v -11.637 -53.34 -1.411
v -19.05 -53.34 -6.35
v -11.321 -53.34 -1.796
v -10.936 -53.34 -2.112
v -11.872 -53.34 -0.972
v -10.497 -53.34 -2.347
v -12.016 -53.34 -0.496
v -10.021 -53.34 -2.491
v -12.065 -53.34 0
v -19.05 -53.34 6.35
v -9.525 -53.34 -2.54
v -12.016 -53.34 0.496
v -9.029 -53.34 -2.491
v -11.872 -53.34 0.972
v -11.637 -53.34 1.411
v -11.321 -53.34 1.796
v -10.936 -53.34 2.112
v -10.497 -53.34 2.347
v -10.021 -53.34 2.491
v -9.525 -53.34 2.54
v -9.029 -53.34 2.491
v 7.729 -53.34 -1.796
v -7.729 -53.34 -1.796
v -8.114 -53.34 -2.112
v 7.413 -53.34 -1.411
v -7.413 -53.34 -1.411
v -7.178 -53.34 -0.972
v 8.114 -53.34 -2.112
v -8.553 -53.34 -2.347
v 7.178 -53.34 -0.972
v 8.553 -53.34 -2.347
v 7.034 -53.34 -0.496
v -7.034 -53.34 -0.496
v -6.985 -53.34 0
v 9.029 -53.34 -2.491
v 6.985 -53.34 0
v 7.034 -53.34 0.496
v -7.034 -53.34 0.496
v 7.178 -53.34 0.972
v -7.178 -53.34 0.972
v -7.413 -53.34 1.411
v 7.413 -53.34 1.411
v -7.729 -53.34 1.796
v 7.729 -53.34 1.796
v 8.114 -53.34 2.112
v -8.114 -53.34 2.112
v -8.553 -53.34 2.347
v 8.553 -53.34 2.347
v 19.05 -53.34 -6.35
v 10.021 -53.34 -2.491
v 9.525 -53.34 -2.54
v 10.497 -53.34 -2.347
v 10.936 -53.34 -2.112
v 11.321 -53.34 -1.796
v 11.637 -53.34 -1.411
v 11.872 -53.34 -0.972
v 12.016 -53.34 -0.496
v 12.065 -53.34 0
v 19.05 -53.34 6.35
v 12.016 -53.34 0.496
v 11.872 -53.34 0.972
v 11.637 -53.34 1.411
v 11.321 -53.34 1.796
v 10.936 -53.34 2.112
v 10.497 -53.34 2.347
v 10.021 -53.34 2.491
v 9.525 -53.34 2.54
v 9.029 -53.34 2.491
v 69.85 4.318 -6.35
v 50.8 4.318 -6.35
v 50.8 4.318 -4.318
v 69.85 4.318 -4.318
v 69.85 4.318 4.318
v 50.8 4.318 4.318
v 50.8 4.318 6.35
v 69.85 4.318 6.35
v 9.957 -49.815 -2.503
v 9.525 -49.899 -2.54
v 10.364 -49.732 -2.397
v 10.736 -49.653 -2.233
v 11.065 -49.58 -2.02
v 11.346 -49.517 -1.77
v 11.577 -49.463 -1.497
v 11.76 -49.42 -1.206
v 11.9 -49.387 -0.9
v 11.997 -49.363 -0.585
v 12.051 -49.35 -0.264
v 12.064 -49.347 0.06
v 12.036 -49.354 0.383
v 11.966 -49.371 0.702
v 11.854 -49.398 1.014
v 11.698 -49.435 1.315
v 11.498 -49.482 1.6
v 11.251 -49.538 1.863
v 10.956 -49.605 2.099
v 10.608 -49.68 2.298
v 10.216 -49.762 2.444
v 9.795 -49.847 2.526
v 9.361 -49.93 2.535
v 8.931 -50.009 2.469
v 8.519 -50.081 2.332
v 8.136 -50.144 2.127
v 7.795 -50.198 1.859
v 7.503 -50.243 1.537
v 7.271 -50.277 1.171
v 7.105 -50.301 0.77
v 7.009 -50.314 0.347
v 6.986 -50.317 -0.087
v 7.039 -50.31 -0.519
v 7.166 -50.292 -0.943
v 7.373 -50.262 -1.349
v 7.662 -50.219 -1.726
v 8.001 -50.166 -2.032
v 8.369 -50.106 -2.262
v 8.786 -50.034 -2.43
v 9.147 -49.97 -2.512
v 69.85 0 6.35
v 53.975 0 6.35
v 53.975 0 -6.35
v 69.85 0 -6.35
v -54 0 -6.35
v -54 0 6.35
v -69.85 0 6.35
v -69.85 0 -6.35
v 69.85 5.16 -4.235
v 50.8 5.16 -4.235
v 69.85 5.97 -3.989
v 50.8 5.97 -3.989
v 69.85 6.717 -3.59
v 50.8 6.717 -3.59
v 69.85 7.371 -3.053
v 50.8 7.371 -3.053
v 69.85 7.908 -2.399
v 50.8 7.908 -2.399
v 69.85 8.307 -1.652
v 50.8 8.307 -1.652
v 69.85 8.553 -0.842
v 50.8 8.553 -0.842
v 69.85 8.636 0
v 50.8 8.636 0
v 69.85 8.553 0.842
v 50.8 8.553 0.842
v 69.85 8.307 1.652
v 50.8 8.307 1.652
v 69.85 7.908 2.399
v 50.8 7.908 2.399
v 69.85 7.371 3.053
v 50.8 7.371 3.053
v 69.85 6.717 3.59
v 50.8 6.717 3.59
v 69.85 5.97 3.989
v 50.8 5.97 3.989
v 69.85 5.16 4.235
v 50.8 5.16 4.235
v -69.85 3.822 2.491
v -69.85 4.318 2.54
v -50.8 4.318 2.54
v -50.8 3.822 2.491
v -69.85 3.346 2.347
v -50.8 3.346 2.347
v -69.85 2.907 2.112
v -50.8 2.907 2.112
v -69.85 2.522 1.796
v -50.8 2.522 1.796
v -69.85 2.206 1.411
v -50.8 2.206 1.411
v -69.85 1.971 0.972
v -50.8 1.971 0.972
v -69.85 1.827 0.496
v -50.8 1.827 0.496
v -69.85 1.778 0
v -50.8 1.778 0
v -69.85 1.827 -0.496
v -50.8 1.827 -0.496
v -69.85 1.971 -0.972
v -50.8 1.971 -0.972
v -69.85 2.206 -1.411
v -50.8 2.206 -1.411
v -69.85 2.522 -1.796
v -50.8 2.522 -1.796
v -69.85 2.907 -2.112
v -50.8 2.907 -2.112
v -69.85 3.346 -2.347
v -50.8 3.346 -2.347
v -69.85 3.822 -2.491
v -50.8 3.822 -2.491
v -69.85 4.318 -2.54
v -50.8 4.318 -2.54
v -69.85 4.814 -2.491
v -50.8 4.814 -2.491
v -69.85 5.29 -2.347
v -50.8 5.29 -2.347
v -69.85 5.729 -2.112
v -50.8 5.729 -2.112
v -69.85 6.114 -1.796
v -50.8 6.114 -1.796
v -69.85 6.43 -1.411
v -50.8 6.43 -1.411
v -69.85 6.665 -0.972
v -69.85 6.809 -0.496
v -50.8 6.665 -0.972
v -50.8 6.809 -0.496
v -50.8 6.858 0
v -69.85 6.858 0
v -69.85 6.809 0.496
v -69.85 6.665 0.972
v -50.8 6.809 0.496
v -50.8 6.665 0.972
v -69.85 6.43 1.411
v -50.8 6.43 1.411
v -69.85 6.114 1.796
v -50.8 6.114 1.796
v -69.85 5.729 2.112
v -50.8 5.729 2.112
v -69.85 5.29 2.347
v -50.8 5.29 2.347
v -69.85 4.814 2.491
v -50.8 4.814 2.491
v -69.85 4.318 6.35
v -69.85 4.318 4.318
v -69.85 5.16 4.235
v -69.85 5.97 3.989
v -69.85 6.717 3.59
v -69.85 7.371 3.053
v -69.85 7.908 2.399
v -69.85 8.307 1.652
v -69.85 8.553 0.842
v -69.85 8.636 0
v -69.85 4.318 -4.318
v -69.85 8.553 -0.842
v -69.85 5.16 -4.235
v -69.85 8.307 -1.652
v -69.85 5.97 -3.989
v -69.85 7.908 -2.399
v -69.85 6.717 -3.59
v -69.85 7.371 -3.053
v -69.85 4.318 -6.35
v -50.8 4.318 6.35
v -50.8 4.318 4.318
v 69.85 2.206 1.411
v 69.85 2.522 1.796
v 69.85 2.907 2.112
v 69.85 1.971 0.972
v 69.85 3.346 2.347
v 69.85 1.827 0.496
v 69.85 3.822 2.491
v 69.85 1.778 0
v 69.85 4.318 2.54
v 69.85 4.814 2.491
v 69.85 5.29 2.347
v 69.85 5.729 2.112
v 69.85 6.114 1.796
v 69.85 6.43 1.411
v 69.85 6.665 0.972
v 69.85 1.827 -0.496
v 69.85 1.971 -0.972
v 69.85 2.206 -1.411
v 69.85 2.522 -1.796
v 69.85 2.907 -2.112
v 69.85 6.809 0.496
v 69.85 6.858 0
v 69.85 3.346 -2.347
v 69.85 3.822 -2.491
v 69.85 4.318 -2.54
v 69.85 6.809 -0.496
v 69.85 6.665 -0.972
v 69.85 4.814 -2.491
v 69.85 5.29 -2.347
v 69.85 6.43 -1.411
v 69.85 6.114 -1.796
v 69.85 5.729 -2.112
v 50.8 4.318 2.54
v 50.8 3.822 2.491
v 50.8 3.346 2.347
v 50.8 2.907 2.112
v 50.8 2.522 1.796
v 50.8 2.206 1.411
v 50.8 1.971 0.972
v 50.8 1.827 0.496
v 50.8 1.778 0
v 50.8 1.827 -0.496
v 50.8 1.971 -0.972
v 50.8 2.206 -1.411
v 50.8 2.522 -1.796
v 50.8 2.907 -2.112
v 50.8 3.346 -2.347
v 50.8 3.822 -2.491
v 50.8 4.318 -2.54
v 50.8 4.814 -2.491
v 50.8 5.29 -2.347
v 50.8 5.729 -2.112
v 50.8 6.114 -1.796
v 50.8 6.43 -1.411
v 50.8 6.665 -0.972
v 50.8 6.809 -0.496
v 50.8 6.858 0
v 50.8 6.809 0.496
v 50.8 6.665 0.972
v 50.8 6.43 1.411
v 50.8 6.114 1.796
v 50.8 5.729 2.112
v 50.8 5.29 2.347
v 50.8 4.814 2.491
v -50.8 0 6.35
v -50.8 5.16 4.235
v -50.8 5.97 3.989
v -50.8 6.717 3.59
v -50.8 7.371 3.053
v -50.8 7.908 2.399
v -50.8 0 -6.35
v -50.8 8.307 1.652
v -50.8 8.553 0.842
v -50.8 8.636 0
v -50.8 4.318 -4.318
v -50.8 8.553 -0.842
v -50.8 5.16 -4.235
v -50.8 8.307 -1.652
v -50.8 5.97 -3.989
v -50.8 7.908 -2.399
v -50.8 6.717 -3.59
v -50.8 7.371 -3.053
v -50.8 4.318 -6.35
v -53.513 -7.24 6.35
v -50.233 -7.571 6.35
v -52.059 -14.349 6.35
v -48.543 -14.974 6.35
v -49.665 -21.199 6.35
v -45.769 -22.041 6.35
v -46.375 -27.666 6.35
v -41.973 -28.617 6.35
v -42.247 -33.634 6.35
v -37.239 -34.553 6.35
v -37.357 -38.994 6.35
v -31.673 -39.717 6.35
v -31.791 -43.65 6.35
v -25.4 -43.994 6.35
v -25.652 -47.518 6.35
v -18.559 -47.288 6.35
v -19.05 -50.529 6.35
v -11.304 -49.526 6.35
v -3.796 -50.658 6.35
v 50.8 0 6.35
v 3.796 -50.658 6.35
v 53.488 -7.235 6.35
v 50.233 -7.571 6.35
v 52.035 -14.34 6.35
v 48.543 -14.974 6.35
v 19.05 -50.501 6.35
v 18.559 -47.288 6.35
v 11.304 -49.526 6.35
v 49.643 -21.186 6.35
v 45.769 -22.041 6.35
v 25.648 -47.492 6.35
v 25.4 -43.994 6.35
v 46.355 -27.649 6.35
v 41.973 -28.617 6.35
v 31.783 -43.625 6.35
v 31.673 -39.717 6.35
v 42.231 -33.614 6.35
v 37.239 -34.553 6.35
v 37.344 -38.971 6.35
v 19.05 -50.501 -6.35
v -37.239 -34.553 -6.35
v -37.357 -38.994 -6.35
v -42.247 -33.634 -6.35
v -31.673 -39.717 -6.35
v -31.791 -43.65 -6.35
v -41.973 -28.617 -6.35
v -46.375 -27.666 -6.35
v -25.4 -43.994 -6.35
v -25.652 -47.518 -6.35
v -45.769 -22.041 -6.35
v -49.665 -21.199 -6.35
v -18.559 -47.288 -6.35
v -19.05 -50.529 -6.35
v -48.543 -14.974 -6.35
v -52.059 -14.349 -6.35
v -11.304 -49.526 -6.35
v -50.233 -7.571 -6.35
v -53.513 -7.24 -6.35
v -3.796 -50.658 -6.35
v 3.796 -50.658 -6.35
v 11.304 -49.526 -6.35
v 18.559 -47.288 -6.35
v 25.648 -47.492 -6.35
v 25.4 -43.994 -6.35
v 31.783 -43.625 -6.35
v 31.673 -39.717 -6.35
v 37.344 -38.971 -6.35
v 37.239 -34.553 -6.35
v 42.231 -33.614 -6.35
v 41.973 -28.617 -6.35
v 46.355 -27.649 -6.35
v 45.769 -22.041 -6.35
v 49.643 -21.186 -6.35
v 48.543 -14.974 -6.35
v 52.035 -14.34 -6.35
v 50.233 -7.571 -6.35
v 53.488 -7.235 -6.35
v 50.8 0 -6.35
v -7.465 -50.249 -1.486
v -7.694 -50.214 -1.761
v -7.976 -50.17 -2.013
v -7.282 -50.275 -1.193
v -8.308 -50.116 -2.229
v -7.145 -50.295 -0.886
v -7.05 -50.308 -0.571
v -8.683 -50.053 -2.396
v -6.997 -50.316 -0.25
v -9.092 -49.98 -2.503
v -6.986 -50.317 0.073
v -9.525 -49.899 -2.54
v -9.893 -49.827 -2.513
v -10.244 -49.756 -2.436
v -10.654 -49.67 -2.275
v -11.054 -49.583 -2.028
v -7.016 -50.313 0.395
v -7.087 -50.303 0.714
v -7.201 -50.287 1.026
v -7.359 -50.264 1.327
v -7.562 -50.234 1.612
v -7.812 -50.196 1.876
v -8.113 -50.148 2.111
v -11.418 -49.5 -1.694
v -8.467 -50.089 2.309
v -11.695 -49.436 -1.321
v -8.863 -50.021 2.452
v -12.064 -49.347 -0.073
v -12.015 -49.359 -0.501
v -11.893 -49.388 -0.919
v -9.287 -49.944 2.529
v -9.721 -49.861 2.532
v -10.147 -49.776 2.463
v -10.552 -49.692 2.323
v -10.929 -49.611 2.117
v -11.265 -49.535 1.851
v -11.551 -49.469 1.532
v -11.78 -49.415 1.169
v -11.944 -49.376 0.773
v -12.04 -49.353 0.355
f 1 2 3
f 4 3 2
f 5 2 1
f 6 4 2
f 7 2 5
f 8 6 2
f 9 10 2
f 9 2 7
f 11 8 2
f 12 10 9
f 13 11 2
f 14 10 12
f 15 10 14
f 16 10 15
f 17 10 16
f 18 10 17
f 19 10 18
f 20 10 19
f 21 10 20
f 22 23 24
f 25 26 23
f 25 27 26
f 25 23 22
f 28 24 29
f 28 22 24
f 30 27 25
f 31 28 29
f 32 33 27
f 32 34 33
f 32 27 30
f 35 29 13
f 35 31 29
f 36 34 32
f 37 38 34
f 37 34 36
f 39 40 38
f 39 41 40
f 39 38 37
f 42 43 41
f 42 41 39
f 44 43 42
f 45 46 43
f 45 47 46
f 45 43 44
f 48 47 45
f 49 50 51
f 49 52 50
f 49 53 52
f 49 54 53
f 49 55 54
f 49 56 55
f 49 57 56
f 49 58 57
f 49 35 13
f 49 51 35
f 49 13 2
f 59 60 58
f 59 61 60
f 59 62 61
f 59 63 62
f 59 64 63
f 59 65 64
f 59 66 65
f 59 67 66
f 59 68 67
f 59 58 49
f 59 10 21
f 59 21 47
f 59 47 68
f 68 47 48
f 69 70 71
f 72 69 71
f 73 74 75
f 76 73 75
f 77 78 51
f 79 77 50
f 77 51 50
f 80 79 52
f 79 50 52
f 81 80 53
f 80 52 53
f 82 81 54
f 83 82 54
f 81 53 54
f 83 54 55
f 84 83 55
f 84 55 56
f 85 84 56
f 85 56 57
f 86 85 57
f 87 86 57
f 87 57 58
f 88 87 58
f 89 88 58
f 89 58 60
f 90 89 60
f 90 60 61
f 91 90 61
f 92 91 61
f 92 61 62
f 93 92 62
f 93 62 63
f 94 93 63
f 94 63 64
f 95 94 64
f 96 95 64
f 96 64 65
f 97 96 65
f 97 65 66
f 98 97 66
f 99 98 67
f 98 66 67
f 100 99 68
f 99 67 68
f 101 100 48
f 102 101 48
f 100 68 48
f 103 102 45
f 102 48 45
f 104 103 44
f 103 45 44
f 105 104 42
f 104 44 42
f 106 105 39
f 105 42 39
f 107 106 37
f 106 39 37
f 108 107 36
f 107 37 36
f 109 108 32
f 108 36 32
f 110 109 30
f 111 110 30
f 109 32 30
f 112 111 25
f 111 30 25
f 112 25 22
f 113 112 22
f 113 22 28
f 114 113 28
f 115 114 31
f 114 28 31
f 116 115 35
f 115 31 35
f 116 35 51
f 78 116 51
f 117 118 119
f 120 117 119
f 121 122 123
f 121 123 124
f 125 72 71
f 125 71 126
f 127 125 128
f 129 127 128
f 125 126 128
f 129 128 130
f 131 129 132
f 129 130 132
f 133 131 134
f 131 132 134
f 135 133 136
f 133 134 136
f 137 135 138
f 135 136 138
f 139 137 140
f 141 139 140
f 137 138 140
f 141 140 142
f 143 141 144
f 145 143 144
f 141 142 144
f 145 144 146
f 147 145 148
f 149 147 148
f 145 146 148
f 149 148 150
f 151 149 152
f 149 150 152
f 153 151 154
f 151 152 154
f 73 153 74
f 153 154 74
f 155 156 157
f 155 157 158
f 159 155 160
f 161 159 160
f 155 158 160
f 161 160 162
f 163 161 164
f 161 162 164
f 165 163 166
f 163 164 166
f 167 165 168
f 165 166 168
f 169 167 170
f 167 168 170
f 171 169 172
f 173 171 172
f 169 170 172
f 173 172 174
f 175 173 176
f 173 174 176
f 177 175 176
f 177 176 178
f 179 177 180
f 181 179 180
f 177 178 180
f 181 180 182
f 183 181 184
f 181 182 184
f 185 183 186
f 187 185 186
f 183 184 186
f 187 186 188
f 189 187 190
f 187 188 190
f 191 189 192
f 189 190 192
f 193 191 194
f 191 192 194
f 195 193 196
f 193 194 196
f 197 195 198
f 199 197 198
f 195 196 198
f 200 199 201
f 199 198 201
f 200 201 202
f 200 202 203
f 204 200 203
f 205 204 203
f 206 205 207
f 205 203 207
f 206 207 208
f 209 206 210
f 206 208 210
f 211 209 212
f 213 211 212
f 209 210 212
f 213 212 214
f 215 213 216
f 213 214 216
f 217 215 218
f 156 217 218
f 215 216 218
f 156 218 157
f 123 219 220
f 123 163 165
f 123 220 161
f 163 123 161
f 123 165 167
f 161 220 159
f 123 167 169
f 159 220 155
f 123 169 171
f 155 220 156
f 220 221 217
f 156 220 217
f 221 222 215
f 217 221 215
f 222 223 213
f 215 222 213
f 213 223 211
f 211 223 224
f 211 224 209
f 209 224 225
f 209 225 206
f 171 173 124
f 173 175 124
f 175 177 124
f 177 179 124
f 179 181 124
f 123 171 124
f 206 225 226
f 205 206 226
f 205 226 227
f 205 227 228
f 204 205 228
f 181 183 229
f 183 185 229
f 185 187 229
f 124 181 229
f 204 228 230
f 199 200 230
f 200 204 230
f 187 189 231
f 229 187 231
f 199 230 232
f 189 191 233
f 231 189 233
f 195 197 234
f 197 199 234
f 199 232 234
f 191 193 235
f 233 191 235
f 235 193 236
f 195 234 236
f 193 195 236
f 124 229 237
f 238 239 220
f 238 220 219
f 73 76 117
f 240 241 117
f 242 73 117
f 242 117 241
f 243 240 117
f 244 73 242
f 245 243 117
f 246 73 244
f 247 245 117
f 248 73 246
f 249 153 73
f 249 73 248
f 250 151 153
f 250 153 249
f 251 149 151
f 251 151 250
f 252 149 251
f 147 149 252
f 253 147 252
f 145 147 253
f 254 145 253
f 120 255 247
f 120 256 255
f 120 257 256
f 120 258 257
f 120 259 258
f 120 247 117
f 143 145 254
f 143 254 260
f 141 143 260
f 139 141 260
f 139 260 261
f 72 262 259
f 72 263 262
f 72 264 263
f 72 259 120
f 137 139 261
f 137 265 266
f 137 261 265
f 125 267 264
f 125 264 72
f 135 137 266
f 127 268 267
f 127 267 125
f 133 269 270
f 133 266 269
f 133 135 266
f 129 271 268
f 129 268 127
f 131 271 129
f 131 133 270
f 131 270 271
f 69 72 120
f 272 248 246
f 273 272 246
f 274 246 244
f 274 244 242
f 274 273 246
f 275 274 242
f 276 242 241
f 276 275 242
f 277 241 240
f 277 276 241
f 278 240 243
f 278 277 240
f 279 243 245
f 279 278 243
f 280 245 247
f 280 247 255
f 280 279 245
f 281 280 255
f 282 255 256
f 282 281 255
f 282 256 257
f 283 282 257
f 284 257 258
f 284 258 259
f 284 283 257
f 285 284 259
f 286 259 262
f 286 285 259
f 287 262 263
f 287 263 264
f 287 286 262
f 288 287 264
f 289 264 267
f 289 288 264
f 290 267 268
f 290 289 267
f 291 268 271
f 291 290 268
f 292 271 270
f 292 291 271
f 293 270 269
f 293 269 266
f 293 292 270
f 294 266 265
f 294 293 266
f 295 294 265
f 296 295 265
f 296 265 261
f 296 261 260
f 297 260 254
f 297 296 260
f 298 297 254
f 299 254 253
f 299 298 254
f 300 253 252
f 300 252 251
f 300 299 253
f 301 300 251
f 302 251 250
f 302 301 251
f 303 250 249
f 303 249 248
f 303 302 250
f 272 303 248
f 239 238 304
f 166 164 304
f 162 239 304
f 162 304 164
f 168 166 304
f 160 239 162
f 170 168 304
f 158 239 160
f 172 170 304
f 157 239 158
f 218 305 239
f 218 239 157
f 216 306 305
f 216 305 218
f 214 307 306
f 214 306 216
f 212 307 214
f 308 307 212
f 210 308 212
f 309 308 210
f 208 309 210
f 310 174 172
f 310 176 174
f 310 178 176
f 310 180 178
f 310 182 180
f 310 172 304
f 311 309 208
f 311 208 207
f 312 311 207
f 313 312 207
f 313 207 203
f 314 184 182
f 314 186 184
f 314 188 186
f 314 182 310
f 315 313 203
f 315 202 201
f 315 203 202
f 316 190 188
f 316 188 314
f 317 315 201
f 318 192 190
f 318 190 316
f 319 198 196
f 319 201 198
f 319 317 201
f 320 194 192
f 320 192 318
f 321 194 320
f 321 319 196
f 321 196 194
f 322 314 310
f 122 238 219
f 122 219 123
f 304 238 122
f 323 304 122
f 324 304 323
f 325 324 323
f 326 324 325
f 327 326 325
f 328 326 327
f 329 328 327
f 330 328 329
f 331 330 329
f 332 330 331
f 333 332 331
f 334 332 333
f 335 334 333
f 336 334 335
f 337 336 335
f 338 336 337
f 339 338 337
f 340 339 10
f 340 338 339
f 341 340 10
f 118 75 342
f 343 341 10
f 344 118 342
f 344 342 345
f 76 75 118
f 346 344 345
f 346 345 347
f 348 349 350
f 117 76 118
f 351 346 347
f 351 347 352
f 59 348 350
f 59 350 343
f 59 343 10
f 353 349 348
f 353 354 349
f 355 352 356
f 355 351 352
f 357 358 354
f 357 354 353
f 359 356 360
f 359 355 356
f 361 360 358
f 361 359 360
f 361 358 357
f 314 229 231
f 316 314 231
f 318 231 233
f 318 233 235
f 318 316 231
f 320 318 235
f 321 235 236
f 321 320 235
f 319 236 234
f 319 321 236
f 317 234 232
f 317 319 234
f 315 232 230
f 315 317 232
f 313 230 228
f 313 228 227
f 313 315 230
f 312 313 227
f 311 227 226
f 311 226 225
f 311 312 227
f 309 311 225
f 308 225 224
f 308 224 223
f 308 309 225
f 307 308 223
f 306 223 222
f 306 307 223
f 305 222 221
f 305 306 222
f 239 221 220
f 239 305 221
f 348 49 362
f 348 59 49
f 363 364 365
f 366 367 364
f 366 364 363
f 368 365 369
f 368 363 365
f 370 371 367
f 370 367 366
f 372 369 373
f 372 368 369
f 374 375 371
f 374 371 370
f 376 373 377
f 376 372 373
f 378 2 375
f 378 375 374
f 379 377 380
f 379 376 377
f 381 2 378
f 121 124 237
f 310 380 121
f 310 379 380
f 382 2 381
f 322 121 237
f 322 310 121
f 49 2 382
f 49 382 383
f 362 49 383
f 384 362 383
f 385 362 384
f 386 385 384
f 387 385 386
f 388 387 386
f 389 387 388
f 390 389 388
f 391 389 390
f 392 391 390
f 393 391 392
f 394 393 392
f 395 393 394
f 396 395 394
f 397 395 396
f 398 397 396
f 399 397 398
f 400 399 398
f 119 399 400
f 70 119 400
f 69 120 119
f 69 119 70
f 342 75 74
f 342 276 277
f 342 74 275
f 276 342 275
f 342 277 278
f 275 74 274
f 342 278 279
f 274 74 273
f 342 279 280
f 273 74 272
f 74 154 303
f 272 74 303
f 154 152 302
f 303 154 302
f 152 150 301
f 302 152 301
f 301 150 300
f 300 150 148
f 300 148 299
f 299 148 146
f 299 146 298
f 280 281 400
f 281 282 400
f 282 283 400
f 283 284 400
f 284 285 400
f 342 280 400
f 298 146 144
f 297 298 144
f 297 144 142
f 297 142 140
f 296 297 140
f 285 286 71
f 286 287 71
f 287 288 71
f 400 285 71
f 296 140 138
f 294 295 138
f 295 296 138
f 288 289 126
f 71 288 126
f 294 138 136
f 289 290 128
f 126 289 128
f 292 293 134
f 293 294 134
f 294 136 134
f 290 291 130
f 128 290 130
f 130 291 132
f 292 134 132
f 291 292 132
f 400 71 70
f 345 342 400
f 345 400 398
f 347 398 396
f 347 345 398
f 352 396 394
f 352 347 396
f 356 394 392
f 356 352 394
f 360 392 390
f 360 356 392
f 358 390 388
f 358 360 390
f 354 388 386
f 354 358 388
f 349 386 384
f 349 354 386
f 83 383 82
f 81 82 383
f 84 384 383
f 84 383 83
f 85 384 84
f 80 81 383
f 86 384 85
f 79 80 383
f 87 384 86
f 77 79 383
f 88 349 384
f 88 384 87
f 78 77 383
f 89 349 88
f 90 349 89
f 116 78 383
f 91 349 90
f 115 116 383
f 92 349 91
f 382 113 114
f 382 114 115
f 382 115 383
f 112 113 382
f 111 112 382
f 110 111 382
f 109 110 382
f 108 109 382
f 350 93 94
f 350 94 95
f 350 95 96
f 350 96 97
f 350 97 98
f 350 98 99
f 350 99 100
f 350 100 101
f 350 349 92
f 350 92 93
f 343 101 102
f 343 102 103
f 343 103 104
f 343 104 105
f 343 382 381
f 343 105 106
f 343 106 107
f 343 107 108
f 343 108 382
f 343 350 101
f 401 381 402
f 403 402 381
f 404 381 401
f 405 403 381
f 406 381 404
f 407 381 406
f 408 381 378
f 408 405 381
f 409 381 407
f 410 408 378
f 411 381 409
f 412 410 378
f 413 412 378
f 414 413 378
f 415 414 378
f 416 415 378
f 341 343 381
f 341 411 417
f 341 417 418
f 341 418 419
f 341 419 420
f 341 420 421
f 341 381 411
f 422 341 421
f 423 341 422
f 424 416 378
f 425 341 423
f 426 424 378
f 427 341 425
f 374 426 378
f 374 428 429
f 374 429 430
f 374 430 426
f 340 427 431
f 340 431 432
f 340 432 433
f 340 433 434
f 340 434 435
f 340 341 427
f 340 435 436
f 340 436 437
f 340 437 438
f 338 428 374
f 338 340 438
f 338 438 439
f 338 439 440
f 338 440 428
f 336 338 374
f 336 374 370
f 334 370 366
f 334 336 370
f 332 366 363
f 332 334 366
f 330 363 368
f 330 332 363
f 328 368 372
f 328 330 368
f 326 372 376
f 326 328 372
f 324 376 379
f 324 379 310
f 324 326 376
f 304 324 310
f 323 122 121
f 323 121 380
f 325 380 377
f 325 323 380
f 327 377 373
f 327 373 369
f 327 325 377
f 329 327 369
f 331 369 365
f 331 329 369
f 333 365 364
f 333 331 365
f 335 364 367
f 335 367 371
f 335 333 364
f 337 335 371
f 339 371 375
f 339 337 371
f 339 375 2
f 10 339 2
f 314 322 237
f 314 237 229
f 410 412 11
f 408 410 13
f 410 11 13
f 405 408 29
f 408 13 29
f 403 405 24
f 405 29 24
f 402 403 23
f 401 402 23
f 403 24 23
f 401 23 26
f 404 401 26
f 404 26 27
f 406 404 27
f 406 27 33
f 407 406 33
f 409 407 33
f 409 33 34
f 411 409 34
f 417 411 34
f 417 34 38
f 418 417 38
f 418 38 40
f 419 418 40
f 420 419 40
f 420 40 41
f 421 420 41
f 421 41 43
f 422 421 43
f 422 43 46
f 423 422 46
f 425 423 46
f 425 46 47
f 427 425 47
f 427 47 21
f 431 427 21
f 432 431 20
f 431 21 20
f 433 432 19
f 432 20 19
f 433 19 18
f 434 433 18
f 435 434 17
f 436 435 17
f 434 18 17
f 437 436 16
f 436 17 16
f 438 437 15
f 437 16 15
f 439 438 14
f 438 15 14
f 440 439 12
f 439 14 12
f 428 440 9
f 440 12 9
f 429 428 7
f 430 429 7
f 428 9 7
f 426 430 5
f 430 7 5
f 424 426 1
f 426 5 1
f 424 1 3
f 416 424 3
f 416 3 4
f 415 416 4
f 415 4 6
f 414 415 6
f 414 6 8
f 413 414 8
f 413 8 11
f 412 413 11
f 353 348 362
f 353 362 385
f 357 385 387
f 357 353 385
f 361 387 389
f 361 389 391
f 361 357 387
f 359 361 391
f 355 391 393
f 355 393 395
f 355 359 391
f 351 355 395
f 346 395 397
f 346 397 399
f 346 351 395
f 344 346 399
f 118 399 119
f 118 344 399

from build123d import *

# Parameters (mm, degrees)
BOSS_EXTRUDE1_DEPTH = 6.35
SKETCH2_R           = 2.54
BOSS_EXTRUDE2_DEPTH = 19.05
SKETCH3_R           = 2.54
CUT_EXTRUDE1_DEPTH  = 19.05


with BuildPart() as part:
    # Sketch1 → Boss-Extrude1 (new, symmetric)
    with BuildSketch(Plane.XY):
        with BuildLine():
            Line((0, -53.34), (19.05, -53.34))
            Line((19.05, -53.34), (19.05, -50.501466563))
            ThreePointArc((19.05, -50.501466563), (44.393267367, -30.700788874), (53.975, 0))
            Line((53.975, 0), (50.8, 0))
            ThreePointArc((50.8, 0), (0, -50.8), (-50.8, 0))
            Line((-50.8, 0), (-54.0004, 0))
            ThreePointArc((-54.0004, 0), (-44.411433326, -30.71917626), (-19.05, -50.528612688))
            Line((-19.05, -50.528612688), (-19.05, -53.34))
            Line((-19.05, -53.34), (0, -53.34))
        make_face()
    extrude(amount=BOSS_EXTRUDE1_DEPTH, both=True)

    # Sketch2 → Boss-Extrude2 (add)
    with BuildSketch(Plane(origin=(50.8, 0, 0), x_dir=(0, 0, -1), z_dir=(1, 0, 0))):
        with BuildLine():
            Line((-6.35, 0), (6.35, 0))
            Line((6.35, 0), (6.35, 4.318))
            Line((6.35, 4.318), (4.318, 4.318))
            ThreePointArc((4.318, 4.318), (0, 8.636), (-4.318, 4.318))
            Line((-4.318, 4.318), (-6.35, 4.318))
            Line((-6.35, 4.318), (-6.35, 0))
        make_face()
        with Locations(Location((0, 4.318, 0), (0, 0, 180))):
            Circle(SKETCH2_R, mode=Mode.SUBTRACT)
    boss_extrude2 = extrude(amount=BOSS_EXTRUDE2_DEPTH)

    # Mirror1: Boss-Extrude2 across plane
    add(boss_extrude2.mirror(Plane(origin=(0, 0, 0), x_dir=(0, 0, 1), z_dir=(1, 0, 0))))

    # Sketch3 → Cut-Extrude1 (cut)
    with BuildSketch(Plane.XZ.offset(53.34)):
        with Locations(Location((-9.525, 0, 0), (0, 0, 270))):
            Circle(SKETCH3_R)
        with Locations(Location((9.525, 0, 0), (0, 0, 270))):
            Circle(SKETCH3_R)
    extrude(amount=-CUT_EXTRUDE1_DEPTH, mode=Mode.SUBTRACT)


solid = part.part
